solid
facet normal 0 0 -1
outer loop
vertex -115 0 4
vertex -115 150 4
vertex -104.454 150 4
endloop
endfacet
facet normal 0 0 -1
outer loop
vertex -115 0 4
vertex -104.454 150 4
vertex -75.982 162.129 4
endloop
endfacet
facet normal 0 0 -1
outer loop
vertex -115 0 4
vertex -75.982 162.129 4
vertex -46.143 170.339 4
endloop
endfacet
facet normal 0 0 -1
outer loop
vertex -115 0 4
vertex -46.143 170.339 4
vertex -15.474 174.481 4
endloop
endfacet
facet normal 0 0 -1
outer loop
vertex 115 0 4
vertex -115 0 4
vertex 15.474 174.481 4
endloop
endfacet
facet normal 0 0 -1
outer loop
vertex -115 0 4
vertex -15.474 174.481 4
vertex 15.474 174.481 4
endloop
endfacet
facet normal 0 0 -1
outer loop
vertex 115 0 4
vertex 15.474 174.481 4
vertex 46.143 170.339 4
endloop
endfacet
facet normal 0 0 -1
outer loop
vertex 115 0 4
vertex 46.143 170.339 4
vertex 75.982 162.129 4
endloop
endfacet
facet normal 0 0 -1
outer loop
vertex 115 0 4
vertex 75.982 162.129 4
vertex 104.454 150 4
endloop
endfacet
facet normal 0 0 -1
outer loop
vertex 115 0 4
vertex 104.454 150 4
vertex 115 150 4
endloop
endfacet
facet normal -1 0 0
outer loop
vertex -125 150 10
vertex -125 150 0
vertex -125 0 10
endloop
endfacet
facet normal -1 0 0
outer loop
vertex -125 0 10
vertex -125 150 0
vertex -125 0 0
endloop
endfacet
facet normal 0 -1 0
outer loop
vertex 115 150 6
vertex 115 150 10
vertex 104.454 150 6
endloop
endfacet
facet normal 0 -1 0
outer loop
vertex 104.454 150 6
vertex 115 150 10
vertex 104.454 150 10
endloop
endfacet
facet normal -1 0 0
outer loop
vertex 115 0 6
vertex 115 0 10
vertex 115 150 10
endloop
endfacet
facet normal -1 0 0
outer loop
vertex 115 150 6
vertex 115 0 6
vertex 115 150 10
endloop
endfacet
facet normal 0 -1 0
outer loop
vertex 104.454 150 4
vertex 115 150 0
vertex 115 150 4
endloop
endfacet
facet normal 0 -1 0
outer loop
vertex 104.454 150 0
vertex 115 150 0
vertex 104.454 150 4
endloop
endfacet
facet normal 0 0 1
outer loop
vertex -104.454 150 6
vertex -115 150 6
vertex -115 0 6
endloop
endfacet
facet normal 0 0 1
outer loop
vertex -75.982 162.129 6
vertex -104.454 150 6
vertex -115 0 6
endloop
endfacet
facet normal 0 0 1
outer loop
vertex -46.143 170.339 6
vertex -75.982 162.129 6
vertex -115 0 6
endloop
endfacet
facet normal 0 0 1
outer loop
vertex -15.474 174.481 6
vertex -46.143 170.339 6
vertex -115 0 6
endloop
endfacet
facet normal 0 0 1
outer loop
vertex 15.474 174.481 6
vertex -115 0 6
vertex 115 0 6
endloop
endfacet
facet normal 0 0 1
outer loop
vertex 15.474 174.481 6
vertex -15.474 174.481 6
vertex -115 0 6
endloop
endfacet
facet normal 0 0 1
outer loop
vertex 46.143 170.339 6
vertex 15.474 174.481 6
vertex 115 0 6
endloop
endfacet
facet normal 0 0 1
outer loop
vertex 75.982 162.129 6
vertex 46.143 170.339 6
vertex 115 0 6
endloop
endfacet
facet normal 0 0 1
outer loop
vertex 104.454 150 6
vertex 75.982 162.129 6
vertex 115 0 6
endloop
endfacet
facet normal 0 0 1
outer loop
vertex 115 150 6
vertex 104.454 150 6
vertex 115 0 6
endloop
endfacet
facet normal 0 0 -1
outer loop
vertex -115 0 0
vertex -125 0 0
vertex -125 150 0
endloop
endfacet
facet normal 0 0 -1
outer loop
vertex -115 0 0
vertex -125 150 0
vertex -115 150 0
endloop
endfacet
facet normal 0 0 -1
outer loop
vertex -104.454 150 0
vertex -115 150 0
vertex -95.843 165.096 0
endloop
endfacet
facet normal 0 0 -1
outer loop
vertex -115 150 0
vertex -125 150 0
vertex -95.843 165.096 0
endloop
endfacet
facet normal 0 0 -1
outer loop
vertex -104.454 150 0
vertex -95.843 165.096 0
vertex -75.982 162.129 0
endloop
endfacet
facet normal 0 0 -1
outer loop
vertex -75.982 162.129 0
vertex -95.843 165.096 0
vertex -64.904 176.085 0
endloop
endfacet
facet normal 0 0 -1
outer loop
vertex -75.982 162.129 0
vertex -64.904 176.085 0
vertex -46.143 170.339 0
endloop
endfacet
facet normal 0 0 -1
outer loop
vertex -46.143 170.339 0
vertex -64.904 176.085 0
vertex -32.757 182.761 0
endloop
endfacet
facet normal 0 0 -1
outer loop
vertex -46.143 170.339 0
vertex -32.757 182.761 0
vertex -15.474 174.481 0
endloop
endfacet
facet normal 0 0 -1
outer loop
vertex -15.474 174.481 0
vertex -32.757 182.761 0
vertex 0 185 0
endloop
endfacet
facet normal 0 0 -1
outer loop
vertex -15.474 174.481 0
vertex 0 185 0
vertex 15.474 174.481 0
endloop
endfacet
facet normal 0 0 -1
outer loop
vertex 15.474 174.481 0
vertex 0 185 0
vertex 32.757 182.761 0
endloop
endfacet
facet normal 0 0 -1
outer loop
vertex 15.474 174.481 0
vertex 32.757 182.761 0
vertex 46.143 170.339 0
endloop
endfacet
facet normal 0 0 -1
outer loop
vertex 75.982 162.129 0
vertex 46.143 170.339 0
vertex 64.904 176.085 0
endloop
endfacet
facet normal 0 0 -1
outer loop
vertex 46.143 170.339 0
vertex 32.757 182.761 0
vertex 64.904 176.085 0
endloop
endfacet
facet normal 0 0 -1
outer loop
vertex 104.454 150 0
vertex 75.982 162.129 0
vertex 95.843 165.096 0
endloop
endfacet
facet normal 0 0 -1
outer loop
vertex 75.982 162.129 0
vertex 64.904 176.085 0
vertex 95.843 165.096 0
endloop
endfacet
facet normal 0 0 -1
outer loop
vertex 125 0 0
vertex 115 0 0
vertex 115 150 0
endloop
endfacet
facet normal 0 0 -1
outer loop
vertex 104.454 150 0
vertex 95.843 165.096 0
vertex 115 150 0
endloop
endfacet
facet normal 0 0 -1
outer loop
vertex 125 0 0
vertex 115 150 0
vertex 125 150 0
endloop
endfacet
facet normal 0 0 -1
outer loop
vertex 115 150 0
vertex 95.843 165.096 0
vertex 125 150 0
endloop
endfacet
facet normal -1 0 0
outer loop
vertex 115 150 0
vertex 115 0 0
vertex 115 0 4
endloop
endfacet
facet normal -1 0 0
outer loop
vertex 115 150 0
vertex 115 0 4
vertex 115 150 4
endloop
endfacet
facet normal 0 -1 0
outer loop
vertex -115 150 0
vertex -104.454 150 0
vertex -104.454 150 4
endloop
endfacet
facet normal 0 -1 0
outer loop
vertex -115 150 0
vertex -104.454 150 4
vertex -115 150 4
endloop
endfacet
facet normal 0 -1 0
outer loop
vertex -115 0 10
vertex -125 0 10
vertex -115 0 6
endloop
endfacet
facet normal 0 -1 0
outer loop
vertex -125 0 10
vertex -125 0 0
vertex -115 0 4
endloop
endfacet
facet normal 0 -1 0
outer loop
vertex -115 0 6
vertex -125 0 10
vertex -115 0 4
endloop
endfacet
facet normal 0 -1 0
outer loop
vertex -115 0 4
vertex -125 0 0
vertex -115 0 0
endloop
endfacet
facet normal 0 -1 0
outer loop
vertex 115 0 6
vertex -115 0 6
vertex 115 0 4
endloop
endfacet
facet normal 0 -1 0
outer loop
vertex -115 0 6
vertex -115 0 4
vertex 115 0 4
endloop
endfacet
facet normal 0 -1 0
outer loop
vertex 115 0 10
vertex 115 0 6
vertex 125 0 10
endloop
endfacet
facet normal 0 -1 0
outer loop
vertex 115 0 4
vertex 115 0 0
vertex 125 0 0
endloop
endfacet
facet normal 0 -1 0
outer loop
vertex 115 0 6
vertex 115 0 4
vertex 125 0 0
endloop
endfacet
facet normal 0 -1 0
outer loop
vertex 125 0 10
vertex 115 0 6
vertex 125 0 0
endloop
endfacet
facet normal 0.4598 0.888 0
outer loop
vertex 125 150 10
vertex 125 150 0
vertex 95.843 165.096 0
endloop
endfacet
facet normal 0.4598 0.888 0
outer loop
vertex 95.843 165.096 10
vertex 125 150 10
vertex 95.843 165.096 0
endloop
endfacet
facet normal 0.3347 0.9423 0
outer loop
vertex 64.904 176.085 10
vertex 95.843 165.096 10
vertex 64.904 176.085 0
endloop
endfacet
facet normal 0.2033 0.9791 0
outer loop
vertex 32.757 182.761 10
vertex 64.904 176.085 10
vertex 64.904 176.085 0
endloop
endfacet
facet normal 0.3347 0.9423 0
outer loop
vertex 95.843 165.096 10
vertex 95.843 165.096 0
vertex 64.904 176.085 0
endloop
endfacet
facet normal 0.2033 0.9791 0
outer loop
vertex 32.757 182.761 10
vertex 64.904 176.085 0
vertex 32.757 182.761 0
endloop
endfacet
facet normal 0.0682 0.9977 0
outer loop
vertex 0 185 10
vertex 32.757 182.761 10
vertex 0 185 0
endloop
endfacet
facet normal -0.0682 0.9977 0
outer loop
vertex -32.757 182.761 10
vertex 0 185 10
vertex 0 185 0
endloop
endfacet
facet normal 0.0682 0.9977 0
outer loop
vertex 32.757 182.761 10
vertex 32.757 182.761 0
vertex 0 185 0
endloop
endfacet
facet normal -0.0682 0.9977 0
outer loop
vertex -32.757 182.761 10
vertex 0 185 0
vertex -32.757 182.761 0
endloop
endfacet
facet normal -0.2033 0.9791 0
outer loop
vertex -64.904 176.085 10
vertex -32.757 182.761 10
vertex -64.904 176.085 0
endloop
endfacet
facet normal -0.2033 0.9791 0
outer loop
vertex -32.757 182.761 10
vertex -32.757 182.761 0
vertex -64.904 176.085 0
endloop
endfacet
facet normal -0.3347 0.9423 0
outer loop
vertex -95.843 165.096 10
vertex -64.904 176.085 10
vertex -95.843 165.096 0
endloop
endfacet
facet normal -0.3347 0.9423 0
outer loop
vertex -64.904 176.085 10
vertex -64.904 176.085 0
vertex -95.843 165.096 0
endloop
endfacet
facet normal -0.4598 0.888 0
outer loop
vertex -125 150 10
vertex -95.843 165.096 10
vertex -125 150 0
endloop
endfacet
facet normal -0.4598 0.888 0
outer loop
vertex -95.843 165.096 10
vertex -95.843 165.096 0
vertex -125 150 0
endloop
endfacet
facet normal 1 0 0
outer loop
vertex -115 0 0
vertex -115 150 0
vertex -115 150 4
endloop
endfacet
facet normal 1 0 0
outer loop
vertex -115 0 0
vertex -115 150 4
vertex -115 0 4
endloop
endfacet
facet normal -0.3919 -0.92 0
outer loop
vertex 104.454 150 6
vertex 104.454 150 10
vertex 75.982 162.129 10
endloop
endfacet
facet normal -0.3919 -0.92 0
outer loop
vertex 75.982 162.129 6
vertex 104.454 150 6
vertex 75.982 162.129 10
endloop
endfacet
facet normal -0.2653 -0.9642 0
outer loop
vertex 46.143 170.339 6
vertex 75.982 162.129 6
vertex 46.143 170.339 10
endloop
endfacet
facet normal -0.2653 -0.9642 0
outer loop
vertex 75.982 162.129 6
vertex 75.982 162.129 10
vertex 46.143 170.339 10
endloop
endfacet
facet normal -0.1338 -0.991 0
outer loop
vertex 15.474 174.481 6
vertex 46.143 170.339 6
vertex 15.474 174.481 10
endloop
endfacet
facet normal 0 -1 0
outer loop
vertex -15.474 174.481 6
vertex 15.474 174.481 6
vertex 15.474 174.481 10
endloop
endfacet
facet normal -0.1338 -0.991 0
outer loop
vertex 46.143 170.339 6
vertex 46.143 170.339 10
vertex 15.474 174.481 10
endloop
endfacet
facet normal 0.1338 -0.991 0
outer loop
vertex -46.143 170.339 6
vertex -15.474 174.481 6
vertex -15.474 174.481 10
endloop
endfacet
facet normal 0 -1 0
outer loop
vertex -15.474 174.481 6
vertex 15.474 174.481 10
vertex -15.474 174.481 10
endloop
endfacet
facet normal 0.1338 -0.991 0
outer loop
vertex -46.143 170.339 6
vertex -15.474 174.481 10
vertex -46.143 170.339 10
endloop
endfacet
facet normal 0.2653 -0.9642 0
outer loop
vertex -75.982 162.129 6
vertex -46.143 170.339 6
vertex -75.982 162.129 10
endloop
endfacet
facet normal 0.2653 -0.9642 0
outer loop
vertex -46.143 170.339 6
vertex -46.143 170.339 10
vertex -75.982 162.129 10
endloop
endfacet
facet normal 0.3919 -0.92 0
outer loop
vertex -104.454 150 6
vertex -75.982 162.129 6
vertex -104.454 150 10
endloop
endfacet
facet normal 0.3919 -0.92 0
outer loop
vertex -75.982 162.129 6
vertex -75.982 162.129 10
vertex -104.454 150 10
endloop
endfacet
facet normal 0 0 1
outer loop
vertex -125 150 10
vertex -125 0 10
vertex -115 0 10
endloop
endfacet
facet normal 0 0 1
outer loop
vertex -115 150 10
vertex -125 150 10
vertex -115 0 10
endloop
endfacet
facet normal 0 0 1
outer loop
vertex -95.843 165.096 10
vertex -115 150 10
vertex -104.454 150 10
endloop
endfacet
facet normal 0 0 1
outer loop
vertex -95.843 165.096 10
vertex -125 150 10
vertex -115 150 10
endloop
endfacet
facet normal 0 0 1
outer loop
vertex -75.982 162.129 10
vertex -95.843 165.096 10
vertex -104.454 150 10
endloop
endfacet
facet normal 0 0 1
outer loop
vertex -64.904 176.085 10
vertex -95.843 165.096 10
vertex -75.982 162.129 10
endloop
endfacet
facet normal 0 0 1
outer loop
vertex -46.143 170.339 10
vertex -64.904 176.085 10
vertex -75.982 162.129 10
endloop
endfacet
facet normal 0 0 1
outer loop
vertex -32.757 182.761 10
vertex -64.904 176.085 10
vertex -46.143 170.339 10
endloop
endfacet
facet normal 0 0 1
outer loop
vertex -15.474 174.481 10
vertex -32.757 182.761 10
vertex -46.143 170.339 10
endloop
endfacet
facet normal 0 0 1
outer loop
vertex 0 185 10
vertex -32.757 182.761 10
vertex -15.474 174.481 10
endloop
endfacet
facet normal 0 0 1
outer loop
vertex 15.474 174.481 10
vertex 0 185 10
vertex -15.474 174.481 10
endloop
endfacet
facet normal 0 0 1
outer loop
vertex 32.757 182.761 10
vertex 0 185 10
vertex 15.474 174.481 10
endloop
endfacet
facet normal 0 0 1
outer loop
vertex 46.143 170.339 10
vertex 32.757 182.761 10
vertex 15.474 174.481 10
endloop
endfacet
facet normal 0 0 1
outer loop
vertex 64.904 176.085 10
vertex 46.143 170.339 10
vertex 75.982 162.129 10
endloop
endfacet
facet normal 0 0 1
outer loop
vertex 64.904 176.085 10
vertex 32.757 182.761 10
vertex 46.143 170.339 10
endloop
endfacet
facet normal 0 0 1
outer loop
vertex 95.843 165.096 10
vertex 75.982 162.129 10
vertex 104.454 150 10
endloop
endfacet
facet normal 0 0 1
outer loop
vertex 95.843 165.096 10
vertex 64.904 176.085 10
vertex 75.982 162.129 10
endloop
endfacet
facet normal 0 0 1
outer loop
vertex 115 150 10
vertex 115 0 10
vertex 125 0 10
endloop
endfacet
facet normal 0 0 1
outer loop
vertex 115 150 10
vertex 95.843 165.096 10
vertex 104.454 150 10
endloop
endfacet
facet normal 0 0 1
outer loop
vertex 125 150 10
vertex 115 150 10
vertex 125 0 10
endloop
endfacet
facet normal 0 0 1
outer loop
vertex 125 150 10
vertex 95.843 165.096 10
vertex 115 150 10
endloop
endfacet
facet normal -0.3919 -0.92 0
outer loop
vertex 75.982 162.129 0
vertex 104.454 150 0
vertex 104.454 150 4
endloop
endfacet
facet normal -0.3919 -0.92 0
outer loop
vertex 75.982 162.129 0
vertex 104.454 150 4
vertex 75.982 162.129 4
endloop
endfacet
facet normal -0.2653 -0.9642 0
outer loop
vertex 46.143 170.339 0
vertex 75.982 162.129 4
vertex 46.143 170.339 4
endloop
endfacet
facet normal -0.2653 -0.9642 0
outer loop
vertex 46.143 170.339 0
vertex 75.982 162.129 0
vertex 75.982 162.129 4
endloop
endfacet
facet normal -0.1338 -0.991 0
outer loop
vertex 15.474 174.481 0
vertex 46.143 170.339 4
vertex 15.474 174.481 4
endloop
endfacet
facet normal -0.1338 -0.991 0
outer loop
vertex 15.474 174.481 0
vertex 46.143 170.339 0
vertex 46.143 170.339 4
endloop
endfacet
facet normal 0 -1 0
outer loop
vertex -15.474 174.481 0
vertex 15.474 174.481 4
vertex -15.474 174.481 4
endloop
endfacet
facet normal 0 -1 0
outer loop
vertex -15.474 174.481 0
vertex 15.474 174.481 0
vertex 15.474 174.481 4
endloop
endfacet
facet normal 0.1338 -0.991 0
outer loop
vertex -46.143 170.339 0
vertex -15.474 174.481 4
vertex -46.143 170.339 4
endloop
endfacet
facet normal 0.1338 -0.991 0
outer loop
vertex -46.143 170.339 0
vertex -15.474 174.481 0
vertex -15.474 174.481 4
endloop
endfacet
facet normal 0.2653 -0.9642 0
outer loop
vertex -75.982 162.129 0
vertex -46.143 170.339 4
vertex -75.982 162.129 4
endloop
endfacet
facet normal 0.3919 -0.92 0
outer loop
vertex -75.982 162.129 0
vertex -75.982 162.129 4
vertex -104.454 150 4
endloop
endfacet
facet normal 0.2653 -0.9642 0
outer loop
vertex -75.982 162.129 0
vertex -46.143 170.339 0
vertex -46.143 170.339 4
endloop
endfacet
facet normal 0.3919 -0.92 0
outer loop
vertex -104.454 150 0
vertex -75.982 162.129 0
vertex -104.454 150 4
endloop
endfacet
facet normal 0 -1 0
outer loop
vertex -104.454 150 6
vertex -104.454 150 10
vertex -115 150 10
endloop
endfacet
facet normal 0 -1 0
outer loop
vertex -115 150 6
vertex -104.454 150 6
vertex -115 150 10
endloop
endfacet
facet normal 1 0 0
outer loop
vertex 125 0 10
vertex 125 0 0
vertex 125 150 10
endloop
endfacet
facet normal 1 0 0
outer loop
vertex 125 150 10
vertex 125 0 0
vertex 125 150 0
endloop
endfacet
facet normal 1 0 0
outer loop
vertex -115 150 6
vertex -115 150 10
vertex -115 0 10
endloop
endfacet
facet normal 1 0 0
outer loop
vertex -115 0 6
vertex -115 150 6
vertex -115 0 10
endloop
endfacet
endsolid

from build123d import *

# Parameters (mm, degrees)
F1_DEPTH = 10
F3_DEPTH = 4
F4_DEPTH = 4


with BuildPart() as f1:
    # F0 (on Top) → F1 (new body)
    with BuildSketch(Plane.XY):
        with BuildLine():
            Line((115, 150), (115, 0))
            Line((115, 0), (125, 0))
            Line((125, 0), (125, 150))
            ThreePointArc((125, 150), (0, 185), (-125, 150))
            Line((-125, 150), (-125, 0))
            Line((-125, 0), (-115, 0))
            Line((-115, 0), (-115, 150))
            Line((-115, 150), (-104.454365, 150))
            ThreePointArc((-104.454365, 150), (0, 175), (104.454365, 150))
            Line((104.454365, 150), (115, 150))
        make_face()
        with BuildLine():
            Line((-115, 0), (115, 0))
            Line((115, 0), (115, 150))
            Line((115, 150), (104.454365, 150))
            ThreePointArc((104.454365, 150), (0, 175), (-104.454365, 150))
            Line((-104.454365, 150), (-115, 150))
            Line((-115, 150), (-115, 0))
        make_face()
    extrude(amount=F1_DEPTH)

    # F2 (on face) → F3 (cut)
    with BuildSketch(Plane.XY.offset(10)):
        with BuildLine():
            Line((-115, 150), (-115, 0))
            Line((-115, 0), (115, 0))
            Line((115, 0), (115, 150))
            Line((115, 150), (104.454365, 150))
            ThreePointArc((104.454365, 150), (0, 175), (-104.454365, 150))
            Line((-104.454365, 150), (-115, 150))
        make_face()
    extrude(amount=-F3_DEPTH, mode=Mode.SUBTRACT)

    # F0 (on Top) → F4 (cut)
    with BuildSketch(Plane.XY):
        with BuildLine():
            Line((-115, 0), (115, 0))
            Line((115, 0), (115, 150))
            Line((115, 150), (104.454365, 150))
            ThreePointArc((104.454365, 150), (0, 175), (-104.454365, 150))
            Line((-104.454365, 150), (-115, 150))
            Line((-115, 150), (-115, 0))
        make_face()
    extrude(amount=F4_DEPTH, mode=Mode.SUBTRACT)


solid = f1.part
